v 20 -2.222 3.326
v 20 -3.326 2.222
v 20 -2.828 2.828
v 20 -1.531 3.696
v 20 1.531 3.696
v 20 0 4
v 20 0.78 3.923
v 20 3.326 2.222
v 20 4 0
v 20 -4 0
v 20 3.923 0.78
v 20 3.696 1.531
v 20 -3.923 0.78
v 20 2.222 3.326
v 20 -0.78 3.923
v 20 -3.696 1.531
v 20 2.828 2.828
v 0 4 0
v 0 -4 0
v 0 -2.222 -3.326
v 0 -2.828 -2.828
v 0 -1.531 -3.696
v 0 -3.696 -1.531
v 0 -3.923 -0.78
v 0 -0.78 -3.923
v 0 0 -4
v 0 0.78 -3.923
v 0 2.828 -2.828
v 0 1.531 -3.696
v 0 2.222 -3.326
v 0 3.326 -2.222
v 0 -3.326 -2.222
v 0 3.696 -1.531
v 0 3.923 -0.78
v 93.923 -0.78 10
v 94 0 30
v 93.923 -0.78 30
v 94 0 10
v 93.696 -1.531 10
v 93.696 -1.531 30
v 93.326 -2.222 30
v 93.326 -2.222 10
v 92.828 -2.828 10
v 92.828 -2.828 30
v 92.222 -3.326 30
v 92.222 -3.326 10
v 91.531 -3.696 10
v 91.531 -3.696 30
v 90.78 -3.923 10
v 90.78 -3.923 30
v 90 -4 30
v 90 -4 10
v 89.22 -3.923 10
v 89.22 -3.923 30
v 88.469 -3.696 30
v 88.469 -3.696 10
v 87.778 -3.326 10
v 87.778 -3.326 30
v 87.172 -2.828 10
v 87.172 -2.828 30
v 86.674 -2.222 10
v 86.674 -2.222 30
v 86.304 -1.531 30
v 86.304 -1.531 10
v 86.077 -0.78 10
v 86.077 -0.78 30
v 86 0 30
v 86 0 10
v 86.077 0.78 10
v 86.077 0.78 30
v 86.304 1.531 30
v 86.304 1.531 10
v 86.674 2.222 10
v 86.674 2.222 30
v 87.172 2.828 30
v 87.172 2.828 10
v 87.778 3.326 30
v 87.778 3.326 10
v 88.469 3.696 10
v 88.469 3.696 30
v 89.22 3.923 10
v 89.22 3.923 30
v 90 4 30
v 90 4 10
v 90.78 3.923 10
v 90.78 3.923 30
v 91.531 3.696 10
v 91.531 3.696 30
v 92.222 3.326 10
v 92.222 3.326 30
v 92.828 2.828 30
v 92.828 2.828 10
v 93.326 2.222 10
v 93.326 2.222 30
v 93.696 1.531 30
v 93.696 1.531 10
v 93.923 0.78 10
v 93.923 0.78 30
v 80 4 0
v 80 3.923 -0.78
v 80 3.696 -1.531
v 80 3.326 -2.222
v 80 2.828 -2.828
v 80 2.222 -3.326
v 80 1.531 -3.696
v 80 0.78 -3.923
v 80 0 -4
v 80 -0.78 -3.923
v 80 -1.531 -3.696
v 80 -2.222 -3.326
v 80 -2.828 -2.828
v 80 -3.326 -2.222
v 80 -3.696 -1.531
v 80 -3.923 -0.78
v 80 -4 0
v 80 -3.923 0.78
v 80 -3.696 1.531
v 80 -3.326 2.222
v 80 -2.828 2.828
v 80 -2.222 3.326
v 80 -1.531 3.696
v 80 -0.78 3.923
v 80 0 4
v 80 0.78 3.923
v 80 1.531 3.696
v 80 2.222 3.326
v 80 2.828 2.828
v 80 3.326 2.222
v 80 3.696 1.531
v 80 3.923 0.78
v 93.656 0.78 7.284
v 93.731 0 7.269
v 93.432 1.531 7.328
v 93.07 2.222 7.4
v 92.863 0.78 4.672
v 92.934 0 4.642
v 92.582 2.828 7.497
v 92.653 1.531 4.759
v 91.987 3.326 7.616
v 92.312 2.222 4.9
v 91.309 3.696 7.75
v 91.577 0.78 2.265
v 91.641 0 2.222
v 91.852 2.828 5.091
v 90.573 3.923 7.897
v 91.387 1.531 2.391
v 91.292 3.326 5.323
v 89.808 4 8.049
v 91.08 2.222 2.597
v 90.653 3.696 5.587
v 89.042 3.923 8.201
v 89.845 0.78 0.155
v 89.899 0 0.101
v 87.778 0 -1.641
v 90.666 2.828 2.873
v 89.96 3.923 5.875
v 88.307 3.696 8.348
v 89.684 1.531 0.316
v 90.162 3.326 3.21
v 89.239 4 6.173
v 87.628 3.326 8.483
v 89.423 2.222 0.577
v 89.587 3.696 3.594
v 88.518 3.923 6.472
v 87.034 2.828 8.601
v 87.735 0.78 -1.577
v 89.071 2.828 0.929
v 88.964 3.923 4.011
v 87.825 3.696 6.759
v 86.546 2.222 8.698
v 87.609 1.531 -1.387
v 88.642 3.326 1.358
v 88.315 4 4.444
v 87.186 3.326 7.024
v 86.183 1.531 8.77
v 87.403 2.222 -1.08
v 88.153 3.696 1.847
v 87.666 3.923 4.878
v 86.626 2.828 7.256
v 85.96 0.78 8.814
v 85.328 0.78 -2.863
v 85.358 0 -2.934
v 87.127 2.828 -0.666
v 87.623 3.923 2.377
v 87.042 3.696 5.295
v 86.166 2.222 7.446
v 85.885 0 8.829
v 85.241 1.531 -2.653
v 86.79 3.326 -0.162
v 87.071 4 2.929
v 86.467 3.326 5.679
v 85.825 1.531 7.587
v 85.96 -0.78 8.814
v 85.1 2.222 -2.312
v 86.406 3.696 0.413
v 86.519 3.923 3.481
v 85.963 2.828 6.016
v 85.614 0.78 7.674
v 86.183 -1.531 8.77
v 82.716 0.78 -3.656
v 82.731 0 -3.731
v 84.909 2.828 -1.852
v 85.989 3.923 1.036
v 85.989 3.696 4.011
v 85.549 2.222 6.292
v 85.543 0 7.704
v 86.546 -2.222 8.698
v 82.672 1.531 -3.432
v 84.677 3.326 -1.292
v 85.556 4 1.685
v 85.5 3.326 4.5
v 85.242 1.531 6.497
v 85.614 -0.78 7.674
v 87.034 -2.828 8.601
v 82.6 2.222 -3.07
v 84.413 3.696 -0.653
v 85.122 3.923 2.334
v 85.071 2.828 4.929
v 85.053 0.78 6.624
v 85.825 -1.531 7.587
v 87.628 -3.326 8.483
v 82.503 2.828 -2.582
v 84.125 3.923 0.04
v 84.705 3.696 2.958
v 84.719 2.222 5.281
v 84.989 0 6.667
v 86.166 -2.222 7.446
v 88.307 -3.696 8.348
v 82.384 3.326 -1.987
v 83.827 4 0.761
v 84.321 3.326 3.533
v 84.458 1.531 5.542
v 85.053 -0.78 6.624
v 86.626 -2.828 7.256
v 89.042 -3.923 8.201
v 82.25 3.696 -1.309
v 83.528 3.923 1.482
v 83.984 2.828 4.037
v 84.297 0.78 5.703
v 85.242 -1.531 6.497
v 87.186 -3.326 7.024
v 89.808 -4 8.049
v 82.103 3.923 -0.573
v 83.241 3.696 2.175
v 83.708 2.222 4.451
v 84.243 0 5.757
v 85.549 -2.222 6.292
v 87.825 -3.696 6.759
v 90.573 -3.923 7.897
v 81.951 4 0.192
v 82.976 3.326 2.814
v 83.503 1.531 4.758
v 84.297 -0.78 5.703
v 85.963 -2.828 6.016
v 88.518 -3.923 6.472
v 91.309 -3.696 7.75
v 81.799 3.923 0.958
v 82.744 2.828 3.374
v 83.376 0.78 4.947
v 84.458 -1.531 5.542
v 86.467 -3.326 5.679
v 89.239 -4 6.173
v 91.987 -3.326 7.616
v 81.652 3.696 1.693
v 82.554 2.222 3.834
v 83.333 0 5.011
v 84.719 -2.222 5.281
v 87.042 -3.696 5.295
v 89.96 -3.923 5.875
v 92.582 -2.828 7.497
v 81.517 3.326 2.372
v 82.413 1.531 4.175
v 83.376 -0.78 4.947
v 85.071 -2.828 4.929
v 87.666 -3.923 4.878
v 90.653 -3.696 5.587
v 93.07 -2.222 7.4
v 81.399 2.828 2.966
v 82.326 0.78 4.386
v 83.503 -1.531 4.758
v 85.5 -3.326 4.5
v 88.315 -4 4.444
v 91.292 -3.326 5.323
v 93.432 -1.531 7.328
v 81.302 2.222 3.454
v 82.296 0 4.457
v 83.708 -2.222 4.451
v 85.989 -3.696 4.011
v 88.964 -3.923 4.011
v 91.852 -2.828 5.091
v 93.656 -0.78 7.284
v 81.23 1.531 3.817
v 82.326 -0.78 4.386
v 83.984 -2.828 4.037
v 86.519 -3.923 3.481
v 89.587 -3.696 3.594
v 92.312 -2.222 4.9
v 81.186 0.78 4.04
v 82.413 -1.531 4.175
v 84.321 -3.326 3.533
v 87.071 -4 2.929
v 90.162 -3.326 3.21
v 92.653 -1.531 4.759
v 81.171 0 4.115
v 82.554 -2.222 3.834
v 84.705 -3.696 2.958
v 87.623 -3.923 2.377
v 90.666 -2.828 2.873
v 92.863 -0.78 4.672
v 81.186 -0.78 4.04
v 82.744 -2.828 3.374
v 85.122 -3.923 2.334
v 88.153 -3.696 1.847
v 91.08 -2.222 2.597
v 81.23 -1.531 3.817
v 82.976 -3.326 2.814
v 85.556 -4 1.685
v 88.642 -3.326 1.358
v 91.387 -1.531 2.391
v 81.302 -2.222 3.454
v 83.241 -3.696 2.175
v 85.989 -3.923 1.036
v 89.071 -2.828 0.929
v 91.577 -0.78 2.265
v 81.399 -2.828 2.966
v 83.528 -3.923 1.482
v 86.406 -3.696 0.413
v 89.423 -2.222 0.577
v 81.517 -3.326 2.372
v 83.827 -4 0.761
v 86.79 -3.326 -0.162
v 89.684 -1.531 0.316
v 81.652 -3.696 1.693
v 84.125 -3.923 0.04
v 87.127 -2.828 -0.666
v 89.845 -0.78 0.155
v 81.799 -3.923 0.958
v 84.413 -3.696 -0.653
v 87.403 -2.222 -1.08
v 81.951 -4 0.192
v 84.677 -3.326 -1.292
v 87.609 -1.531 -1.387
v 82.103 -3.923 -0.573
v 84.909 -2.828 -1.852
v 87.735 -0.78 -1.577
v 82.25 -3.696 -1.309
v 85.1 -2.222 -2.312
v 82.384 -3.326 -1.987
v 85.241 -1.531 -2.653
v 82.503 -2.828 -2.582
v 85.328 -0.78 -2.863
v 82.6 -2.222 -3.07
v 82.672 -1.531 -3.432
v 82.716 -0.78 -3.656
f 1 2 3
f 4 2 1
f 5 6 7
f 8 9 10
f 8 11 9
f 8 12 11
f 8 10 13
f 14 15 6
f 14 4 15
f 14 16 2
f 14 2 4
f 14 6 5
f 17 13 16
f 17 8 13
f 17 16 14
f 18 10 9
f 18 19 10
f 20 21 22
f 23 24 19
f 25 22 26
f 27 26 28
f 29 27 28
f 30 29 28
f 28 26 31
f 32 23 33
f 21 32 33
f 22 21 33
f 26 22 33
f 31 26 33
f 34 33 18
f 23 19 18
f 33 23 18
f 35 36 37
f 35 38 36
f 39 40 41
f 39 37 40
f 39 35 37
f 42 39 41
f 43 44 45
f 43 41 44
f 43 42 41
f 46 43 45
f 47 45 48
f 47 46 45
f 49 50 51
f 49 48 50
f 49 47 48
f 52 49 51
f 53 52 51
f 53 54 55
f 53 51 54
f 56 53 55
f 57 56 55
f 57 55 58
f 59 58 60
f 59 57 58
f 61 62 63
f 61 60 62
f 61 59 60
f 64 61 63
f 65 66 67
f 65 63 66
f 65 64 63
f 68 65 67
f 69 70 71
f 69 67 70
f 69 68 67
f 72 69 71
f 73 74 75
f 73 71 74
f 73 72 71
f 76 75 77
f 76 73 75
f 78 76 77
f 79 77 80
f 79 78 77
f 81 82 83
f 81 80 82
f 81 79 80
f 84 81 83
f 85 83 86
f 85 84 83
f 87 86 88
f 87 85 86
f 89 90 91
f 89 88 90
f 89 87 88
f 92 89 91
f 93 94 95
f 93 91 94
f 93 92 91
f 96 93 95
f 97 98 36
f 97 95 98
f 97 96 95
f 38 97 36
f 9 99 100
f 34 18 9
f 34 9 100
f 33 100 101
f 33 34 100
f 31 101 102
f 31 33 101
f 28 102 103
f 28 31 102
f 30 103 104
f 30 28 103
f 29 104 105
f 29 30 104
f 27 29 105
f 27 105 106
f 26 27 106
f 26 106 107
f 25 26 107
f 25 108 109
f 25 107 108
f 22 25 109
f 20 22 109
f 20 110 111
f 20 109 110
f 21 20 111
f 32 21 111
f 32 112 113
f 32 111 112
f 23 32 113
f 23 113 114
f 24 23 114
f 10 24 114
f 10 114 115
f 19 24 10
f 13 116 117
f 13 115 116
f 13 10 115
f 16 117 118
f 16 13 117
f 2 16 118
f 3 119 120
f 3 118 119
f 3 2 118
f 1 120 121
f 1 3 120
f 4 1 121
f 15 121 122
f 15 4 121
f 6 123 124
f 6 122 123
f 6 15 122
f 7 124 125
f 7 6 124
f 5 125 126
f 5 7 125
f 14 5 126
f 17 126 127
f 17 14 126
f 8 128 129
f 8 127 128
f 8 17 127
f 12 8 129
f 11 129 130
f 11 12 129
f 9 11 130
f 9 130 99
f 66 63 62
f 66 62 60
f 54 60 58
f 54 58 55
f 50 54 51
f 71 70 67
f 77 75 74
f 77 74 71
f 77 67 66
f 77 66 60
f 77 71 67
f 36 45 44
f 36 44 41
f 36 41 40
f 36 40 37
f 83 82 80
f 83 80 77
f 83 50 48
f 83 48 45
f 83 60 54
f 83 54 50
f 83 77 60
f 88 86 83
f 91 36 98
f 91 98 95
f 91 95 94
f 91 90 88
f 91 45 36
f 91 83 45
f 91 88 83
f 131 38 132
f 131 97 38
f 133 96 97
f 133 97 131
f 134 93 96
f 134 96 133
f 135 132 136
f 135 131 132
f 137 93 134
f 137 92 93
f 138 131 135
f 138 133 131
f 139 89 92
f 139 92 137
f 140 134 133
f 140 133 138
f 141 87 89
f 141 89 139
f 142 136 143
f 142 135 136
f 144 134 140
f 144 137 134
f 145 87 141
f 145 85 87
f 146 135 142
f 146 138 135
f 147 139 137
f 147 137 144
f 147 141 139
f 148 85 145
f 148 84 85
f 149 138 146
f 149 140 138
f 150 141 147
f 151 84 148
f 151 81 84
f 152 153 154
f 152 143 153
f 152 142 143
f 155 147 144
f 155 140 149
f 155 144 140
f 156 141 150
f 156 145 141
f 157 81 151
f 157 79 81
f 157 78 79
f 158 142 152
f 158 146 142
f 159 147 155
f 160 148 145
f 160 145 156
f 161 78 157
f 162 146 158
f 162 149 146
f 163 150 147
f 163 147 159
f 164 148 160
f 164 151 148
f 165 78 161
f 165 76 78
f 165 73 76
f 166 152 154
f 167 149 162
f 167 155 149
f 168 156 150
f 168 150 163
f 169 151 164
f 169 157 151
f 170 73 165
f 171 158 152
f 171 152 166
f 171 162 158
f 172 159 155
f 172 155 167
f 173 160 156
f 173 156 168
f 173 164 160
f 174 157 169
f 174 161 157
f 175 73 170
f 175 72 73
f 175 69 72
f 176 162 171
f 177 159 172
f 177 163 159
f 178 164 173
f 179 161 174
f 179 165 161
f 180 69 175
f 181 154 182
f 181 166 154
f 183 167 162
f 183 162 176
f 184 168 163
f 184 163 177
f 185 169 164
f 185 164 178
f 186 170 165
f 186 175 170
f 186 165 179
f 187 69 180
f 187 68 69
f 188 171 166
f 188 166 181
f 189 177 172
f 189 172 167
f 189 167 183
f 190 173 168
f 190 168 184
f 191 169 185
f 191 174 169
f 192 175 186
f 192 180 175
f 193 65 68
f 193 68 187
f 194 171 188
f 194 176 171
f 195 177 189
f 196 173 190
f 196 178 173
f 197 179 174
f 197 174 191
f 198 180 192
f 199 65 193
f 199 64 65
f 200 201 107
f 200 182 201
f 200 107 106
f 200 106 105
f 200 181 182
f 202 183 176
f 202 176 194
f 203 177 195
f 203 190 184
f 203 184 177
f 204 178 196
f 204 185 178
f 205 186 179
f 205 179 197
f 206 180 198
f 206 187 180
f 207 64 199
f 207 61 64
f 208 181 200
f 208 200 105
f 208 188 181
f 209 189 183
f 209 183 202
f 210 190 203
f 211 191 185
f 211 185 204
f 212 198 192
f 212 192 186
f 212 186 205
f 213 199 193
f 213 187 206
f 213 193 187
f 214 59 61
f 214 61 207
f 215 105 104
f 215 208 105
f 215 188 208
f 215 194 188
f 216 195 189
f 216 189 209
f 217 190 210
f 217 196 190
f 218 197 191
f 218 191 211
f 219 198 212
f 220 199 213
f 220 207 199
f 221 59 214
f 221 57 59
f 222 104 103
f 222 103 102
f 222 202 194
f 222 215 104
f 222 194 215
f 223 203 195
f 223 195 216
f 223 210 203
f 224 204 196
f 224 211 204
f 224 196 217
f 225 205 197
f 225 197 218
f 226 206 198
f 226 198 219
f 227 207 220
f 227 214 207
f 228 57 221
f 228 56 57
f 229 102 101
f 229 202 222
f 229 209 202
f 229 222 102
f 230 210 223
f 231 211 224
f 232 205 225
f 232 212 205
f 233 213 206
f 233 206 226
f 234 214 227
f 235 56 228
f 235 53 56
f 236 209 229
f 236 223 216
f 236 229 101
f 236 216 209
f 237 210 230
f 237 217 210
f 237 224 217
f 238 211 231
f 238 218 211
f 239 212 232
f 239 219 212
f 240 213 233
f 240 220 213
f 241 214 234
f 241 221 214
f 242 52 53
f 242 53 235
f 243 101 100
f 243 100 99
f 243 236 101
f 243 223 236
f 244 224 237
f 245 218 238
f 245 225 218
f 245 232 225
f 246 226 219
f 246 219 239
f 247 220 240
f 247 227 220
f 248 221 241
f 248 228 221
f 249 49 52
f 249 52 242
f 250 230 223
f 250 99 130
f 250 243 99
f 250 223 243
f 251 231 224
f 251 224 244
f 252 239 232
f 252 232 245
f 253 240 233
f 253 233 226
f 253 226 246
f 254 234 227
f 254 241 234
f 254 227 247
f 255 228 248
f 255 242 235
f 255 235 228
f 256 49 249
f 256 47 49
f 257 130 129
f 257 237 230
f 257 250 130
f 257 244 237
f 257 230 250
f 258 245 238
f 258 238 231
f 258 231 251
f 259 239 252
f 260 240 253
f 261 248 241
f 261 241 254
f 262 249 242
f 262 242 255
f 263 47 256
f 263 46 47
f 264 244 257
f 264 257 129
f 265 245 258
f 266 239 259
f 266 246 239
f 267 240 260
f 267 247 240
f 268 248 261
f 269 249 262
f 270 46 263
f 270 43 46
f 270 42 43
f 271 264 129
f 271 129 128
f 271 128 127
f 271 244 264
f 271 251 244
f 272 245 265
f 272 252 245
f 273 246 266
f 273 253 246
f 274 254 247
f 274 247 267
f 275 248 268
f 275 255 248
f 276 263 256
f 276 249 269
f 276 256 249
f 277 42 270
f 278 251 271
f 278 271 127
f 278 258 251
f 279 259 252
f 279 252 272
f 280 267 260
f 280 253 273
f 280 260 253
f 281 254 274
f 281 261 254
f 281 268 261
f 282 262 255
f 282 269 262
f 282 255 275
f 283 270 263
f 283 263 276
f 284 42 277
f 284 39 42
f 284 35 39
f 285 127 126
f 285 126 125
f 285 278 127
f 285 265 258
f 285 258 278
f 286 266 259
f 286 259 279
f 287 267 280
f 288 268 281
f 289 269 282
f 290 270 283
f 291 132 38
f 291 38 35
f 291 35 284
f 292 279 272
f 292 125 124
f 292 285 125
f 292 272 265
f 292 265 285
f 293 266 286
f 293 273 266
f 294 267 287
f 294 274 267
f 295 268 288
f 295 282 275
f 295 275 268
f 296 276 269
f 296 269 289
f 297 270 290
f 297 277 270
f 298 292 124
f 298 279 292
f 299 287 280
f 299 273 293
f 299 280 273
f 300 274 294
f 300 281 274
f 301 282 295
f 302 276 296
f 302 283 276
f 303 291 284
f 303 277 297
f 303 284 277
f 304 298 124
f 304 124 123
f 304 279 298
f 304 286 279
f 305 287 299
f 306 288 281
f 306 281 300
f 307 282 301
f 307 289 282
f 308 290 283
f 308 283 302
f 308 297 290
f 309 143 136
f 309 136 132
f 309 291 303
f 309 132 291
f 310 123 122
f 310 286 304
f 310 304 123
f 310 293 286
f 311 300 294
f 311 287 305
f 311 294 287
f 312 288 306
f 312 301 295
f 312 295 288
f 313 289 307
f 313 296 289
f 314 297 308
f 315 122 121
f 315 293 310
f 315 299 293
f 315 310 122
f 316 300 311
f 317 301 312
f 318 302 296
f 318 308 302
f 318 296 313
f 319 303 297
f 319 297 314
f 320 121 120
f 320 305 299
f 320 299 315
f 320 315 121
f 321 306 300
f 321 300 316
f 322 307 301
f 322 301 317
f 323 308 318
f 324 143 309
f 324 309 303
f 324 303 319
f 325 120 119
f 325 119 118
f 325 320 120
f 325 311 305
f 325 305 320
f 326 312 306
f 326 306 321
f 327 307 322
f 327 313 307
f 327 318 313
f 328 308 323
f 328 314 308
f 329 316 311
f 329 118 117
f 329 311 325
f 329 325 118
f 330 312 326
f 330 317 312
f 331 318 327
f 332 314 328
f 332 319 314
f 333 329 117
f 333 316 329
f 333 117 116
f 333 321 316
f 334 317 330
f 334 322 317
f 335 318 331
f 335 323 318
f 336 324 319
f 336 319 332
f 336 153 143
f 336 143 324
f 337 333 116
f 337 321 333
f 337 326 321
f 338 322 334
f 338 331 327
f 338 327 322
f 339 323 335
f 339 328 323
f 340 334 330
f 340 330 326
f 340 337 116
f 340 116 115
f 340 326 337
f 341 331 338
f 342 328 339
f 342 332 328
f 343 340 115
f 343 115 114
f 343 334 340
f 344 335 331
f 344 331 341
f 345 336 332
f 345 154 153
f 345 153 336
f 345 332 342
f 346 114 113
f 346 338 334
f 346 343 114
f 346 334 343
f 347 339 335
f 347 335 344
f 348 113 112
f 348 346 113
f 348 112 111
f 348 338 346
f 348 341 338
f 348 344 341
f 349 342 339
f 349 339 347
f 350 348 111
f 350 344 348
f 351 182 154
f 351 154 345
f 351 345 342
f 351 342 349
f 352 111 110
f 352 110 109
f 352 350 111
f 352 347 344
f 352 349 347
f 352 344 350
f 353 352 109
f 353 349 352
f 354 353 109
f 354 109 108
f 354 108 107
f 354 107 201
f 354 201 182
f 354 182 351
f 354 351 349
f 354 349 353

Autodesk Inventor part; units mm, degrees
ref_plane "YZ Plane" through (0, 0, 0) normal (1, 0, 0) x (0, 1, 0)
ref_plane "XZ Plane" through (0, 0, 0) normal (0, 1, 0) x (-1, 0, 0)
ref_plane "XY Plane" through (0, 0, 0) normal (0, 0, 1) x (1, 0, 0)
sketch "Sketch1" plane through (0, 0, 0) normal (1, 0, 0) x (0, 1, 0)
  circle A0 centre (0, 0) radius 4
  dimension "d0" = 8
extrude "Extrusion1" add sketch "Sketch1" along normal blind 80
sketch "Sketch8" plane through (80, 0, 0) normal (1, 0, 0) x (0, 0, -1)
  line L0 (-10, -3.7509) -> (-10, 5.6543)
  circle A0 centre (0, 0) radius 4 projected
  point P0 (-10, 0.9517)
  dimension "d13" = 10
revolve "Revolution2" add sketch "Sketch8" angle 90 about axis through (80, -3.7509, 10) along (0, -1, 0)
sketch "Sketch9" plane through (90, 0, 10) normal (0, 0, 1) x (1, 0, 0)
  circle A0 centre (0, 0) radius 4 projected
  point P0 (-90, 0)
extrude "Extrusion6" add sketch "Sketch9" along normal blind 20
sketch "Sketch10" plane through (0, 0, 0) normal (-1, 0, 0) x (0, 0, 1)
  circle A0 centre (0, 0) radius 4 projected
  line L0 (0, -4.7151) -> (0, 4)
  point P0 (0, -4)
extrude "Extrusion7" cut sketch "Sketch10" against normal blind 20 contours A0 L0 picked at (0.5785, 1.2013)
properties part number "AllenKey-RS3" material "Steel"
